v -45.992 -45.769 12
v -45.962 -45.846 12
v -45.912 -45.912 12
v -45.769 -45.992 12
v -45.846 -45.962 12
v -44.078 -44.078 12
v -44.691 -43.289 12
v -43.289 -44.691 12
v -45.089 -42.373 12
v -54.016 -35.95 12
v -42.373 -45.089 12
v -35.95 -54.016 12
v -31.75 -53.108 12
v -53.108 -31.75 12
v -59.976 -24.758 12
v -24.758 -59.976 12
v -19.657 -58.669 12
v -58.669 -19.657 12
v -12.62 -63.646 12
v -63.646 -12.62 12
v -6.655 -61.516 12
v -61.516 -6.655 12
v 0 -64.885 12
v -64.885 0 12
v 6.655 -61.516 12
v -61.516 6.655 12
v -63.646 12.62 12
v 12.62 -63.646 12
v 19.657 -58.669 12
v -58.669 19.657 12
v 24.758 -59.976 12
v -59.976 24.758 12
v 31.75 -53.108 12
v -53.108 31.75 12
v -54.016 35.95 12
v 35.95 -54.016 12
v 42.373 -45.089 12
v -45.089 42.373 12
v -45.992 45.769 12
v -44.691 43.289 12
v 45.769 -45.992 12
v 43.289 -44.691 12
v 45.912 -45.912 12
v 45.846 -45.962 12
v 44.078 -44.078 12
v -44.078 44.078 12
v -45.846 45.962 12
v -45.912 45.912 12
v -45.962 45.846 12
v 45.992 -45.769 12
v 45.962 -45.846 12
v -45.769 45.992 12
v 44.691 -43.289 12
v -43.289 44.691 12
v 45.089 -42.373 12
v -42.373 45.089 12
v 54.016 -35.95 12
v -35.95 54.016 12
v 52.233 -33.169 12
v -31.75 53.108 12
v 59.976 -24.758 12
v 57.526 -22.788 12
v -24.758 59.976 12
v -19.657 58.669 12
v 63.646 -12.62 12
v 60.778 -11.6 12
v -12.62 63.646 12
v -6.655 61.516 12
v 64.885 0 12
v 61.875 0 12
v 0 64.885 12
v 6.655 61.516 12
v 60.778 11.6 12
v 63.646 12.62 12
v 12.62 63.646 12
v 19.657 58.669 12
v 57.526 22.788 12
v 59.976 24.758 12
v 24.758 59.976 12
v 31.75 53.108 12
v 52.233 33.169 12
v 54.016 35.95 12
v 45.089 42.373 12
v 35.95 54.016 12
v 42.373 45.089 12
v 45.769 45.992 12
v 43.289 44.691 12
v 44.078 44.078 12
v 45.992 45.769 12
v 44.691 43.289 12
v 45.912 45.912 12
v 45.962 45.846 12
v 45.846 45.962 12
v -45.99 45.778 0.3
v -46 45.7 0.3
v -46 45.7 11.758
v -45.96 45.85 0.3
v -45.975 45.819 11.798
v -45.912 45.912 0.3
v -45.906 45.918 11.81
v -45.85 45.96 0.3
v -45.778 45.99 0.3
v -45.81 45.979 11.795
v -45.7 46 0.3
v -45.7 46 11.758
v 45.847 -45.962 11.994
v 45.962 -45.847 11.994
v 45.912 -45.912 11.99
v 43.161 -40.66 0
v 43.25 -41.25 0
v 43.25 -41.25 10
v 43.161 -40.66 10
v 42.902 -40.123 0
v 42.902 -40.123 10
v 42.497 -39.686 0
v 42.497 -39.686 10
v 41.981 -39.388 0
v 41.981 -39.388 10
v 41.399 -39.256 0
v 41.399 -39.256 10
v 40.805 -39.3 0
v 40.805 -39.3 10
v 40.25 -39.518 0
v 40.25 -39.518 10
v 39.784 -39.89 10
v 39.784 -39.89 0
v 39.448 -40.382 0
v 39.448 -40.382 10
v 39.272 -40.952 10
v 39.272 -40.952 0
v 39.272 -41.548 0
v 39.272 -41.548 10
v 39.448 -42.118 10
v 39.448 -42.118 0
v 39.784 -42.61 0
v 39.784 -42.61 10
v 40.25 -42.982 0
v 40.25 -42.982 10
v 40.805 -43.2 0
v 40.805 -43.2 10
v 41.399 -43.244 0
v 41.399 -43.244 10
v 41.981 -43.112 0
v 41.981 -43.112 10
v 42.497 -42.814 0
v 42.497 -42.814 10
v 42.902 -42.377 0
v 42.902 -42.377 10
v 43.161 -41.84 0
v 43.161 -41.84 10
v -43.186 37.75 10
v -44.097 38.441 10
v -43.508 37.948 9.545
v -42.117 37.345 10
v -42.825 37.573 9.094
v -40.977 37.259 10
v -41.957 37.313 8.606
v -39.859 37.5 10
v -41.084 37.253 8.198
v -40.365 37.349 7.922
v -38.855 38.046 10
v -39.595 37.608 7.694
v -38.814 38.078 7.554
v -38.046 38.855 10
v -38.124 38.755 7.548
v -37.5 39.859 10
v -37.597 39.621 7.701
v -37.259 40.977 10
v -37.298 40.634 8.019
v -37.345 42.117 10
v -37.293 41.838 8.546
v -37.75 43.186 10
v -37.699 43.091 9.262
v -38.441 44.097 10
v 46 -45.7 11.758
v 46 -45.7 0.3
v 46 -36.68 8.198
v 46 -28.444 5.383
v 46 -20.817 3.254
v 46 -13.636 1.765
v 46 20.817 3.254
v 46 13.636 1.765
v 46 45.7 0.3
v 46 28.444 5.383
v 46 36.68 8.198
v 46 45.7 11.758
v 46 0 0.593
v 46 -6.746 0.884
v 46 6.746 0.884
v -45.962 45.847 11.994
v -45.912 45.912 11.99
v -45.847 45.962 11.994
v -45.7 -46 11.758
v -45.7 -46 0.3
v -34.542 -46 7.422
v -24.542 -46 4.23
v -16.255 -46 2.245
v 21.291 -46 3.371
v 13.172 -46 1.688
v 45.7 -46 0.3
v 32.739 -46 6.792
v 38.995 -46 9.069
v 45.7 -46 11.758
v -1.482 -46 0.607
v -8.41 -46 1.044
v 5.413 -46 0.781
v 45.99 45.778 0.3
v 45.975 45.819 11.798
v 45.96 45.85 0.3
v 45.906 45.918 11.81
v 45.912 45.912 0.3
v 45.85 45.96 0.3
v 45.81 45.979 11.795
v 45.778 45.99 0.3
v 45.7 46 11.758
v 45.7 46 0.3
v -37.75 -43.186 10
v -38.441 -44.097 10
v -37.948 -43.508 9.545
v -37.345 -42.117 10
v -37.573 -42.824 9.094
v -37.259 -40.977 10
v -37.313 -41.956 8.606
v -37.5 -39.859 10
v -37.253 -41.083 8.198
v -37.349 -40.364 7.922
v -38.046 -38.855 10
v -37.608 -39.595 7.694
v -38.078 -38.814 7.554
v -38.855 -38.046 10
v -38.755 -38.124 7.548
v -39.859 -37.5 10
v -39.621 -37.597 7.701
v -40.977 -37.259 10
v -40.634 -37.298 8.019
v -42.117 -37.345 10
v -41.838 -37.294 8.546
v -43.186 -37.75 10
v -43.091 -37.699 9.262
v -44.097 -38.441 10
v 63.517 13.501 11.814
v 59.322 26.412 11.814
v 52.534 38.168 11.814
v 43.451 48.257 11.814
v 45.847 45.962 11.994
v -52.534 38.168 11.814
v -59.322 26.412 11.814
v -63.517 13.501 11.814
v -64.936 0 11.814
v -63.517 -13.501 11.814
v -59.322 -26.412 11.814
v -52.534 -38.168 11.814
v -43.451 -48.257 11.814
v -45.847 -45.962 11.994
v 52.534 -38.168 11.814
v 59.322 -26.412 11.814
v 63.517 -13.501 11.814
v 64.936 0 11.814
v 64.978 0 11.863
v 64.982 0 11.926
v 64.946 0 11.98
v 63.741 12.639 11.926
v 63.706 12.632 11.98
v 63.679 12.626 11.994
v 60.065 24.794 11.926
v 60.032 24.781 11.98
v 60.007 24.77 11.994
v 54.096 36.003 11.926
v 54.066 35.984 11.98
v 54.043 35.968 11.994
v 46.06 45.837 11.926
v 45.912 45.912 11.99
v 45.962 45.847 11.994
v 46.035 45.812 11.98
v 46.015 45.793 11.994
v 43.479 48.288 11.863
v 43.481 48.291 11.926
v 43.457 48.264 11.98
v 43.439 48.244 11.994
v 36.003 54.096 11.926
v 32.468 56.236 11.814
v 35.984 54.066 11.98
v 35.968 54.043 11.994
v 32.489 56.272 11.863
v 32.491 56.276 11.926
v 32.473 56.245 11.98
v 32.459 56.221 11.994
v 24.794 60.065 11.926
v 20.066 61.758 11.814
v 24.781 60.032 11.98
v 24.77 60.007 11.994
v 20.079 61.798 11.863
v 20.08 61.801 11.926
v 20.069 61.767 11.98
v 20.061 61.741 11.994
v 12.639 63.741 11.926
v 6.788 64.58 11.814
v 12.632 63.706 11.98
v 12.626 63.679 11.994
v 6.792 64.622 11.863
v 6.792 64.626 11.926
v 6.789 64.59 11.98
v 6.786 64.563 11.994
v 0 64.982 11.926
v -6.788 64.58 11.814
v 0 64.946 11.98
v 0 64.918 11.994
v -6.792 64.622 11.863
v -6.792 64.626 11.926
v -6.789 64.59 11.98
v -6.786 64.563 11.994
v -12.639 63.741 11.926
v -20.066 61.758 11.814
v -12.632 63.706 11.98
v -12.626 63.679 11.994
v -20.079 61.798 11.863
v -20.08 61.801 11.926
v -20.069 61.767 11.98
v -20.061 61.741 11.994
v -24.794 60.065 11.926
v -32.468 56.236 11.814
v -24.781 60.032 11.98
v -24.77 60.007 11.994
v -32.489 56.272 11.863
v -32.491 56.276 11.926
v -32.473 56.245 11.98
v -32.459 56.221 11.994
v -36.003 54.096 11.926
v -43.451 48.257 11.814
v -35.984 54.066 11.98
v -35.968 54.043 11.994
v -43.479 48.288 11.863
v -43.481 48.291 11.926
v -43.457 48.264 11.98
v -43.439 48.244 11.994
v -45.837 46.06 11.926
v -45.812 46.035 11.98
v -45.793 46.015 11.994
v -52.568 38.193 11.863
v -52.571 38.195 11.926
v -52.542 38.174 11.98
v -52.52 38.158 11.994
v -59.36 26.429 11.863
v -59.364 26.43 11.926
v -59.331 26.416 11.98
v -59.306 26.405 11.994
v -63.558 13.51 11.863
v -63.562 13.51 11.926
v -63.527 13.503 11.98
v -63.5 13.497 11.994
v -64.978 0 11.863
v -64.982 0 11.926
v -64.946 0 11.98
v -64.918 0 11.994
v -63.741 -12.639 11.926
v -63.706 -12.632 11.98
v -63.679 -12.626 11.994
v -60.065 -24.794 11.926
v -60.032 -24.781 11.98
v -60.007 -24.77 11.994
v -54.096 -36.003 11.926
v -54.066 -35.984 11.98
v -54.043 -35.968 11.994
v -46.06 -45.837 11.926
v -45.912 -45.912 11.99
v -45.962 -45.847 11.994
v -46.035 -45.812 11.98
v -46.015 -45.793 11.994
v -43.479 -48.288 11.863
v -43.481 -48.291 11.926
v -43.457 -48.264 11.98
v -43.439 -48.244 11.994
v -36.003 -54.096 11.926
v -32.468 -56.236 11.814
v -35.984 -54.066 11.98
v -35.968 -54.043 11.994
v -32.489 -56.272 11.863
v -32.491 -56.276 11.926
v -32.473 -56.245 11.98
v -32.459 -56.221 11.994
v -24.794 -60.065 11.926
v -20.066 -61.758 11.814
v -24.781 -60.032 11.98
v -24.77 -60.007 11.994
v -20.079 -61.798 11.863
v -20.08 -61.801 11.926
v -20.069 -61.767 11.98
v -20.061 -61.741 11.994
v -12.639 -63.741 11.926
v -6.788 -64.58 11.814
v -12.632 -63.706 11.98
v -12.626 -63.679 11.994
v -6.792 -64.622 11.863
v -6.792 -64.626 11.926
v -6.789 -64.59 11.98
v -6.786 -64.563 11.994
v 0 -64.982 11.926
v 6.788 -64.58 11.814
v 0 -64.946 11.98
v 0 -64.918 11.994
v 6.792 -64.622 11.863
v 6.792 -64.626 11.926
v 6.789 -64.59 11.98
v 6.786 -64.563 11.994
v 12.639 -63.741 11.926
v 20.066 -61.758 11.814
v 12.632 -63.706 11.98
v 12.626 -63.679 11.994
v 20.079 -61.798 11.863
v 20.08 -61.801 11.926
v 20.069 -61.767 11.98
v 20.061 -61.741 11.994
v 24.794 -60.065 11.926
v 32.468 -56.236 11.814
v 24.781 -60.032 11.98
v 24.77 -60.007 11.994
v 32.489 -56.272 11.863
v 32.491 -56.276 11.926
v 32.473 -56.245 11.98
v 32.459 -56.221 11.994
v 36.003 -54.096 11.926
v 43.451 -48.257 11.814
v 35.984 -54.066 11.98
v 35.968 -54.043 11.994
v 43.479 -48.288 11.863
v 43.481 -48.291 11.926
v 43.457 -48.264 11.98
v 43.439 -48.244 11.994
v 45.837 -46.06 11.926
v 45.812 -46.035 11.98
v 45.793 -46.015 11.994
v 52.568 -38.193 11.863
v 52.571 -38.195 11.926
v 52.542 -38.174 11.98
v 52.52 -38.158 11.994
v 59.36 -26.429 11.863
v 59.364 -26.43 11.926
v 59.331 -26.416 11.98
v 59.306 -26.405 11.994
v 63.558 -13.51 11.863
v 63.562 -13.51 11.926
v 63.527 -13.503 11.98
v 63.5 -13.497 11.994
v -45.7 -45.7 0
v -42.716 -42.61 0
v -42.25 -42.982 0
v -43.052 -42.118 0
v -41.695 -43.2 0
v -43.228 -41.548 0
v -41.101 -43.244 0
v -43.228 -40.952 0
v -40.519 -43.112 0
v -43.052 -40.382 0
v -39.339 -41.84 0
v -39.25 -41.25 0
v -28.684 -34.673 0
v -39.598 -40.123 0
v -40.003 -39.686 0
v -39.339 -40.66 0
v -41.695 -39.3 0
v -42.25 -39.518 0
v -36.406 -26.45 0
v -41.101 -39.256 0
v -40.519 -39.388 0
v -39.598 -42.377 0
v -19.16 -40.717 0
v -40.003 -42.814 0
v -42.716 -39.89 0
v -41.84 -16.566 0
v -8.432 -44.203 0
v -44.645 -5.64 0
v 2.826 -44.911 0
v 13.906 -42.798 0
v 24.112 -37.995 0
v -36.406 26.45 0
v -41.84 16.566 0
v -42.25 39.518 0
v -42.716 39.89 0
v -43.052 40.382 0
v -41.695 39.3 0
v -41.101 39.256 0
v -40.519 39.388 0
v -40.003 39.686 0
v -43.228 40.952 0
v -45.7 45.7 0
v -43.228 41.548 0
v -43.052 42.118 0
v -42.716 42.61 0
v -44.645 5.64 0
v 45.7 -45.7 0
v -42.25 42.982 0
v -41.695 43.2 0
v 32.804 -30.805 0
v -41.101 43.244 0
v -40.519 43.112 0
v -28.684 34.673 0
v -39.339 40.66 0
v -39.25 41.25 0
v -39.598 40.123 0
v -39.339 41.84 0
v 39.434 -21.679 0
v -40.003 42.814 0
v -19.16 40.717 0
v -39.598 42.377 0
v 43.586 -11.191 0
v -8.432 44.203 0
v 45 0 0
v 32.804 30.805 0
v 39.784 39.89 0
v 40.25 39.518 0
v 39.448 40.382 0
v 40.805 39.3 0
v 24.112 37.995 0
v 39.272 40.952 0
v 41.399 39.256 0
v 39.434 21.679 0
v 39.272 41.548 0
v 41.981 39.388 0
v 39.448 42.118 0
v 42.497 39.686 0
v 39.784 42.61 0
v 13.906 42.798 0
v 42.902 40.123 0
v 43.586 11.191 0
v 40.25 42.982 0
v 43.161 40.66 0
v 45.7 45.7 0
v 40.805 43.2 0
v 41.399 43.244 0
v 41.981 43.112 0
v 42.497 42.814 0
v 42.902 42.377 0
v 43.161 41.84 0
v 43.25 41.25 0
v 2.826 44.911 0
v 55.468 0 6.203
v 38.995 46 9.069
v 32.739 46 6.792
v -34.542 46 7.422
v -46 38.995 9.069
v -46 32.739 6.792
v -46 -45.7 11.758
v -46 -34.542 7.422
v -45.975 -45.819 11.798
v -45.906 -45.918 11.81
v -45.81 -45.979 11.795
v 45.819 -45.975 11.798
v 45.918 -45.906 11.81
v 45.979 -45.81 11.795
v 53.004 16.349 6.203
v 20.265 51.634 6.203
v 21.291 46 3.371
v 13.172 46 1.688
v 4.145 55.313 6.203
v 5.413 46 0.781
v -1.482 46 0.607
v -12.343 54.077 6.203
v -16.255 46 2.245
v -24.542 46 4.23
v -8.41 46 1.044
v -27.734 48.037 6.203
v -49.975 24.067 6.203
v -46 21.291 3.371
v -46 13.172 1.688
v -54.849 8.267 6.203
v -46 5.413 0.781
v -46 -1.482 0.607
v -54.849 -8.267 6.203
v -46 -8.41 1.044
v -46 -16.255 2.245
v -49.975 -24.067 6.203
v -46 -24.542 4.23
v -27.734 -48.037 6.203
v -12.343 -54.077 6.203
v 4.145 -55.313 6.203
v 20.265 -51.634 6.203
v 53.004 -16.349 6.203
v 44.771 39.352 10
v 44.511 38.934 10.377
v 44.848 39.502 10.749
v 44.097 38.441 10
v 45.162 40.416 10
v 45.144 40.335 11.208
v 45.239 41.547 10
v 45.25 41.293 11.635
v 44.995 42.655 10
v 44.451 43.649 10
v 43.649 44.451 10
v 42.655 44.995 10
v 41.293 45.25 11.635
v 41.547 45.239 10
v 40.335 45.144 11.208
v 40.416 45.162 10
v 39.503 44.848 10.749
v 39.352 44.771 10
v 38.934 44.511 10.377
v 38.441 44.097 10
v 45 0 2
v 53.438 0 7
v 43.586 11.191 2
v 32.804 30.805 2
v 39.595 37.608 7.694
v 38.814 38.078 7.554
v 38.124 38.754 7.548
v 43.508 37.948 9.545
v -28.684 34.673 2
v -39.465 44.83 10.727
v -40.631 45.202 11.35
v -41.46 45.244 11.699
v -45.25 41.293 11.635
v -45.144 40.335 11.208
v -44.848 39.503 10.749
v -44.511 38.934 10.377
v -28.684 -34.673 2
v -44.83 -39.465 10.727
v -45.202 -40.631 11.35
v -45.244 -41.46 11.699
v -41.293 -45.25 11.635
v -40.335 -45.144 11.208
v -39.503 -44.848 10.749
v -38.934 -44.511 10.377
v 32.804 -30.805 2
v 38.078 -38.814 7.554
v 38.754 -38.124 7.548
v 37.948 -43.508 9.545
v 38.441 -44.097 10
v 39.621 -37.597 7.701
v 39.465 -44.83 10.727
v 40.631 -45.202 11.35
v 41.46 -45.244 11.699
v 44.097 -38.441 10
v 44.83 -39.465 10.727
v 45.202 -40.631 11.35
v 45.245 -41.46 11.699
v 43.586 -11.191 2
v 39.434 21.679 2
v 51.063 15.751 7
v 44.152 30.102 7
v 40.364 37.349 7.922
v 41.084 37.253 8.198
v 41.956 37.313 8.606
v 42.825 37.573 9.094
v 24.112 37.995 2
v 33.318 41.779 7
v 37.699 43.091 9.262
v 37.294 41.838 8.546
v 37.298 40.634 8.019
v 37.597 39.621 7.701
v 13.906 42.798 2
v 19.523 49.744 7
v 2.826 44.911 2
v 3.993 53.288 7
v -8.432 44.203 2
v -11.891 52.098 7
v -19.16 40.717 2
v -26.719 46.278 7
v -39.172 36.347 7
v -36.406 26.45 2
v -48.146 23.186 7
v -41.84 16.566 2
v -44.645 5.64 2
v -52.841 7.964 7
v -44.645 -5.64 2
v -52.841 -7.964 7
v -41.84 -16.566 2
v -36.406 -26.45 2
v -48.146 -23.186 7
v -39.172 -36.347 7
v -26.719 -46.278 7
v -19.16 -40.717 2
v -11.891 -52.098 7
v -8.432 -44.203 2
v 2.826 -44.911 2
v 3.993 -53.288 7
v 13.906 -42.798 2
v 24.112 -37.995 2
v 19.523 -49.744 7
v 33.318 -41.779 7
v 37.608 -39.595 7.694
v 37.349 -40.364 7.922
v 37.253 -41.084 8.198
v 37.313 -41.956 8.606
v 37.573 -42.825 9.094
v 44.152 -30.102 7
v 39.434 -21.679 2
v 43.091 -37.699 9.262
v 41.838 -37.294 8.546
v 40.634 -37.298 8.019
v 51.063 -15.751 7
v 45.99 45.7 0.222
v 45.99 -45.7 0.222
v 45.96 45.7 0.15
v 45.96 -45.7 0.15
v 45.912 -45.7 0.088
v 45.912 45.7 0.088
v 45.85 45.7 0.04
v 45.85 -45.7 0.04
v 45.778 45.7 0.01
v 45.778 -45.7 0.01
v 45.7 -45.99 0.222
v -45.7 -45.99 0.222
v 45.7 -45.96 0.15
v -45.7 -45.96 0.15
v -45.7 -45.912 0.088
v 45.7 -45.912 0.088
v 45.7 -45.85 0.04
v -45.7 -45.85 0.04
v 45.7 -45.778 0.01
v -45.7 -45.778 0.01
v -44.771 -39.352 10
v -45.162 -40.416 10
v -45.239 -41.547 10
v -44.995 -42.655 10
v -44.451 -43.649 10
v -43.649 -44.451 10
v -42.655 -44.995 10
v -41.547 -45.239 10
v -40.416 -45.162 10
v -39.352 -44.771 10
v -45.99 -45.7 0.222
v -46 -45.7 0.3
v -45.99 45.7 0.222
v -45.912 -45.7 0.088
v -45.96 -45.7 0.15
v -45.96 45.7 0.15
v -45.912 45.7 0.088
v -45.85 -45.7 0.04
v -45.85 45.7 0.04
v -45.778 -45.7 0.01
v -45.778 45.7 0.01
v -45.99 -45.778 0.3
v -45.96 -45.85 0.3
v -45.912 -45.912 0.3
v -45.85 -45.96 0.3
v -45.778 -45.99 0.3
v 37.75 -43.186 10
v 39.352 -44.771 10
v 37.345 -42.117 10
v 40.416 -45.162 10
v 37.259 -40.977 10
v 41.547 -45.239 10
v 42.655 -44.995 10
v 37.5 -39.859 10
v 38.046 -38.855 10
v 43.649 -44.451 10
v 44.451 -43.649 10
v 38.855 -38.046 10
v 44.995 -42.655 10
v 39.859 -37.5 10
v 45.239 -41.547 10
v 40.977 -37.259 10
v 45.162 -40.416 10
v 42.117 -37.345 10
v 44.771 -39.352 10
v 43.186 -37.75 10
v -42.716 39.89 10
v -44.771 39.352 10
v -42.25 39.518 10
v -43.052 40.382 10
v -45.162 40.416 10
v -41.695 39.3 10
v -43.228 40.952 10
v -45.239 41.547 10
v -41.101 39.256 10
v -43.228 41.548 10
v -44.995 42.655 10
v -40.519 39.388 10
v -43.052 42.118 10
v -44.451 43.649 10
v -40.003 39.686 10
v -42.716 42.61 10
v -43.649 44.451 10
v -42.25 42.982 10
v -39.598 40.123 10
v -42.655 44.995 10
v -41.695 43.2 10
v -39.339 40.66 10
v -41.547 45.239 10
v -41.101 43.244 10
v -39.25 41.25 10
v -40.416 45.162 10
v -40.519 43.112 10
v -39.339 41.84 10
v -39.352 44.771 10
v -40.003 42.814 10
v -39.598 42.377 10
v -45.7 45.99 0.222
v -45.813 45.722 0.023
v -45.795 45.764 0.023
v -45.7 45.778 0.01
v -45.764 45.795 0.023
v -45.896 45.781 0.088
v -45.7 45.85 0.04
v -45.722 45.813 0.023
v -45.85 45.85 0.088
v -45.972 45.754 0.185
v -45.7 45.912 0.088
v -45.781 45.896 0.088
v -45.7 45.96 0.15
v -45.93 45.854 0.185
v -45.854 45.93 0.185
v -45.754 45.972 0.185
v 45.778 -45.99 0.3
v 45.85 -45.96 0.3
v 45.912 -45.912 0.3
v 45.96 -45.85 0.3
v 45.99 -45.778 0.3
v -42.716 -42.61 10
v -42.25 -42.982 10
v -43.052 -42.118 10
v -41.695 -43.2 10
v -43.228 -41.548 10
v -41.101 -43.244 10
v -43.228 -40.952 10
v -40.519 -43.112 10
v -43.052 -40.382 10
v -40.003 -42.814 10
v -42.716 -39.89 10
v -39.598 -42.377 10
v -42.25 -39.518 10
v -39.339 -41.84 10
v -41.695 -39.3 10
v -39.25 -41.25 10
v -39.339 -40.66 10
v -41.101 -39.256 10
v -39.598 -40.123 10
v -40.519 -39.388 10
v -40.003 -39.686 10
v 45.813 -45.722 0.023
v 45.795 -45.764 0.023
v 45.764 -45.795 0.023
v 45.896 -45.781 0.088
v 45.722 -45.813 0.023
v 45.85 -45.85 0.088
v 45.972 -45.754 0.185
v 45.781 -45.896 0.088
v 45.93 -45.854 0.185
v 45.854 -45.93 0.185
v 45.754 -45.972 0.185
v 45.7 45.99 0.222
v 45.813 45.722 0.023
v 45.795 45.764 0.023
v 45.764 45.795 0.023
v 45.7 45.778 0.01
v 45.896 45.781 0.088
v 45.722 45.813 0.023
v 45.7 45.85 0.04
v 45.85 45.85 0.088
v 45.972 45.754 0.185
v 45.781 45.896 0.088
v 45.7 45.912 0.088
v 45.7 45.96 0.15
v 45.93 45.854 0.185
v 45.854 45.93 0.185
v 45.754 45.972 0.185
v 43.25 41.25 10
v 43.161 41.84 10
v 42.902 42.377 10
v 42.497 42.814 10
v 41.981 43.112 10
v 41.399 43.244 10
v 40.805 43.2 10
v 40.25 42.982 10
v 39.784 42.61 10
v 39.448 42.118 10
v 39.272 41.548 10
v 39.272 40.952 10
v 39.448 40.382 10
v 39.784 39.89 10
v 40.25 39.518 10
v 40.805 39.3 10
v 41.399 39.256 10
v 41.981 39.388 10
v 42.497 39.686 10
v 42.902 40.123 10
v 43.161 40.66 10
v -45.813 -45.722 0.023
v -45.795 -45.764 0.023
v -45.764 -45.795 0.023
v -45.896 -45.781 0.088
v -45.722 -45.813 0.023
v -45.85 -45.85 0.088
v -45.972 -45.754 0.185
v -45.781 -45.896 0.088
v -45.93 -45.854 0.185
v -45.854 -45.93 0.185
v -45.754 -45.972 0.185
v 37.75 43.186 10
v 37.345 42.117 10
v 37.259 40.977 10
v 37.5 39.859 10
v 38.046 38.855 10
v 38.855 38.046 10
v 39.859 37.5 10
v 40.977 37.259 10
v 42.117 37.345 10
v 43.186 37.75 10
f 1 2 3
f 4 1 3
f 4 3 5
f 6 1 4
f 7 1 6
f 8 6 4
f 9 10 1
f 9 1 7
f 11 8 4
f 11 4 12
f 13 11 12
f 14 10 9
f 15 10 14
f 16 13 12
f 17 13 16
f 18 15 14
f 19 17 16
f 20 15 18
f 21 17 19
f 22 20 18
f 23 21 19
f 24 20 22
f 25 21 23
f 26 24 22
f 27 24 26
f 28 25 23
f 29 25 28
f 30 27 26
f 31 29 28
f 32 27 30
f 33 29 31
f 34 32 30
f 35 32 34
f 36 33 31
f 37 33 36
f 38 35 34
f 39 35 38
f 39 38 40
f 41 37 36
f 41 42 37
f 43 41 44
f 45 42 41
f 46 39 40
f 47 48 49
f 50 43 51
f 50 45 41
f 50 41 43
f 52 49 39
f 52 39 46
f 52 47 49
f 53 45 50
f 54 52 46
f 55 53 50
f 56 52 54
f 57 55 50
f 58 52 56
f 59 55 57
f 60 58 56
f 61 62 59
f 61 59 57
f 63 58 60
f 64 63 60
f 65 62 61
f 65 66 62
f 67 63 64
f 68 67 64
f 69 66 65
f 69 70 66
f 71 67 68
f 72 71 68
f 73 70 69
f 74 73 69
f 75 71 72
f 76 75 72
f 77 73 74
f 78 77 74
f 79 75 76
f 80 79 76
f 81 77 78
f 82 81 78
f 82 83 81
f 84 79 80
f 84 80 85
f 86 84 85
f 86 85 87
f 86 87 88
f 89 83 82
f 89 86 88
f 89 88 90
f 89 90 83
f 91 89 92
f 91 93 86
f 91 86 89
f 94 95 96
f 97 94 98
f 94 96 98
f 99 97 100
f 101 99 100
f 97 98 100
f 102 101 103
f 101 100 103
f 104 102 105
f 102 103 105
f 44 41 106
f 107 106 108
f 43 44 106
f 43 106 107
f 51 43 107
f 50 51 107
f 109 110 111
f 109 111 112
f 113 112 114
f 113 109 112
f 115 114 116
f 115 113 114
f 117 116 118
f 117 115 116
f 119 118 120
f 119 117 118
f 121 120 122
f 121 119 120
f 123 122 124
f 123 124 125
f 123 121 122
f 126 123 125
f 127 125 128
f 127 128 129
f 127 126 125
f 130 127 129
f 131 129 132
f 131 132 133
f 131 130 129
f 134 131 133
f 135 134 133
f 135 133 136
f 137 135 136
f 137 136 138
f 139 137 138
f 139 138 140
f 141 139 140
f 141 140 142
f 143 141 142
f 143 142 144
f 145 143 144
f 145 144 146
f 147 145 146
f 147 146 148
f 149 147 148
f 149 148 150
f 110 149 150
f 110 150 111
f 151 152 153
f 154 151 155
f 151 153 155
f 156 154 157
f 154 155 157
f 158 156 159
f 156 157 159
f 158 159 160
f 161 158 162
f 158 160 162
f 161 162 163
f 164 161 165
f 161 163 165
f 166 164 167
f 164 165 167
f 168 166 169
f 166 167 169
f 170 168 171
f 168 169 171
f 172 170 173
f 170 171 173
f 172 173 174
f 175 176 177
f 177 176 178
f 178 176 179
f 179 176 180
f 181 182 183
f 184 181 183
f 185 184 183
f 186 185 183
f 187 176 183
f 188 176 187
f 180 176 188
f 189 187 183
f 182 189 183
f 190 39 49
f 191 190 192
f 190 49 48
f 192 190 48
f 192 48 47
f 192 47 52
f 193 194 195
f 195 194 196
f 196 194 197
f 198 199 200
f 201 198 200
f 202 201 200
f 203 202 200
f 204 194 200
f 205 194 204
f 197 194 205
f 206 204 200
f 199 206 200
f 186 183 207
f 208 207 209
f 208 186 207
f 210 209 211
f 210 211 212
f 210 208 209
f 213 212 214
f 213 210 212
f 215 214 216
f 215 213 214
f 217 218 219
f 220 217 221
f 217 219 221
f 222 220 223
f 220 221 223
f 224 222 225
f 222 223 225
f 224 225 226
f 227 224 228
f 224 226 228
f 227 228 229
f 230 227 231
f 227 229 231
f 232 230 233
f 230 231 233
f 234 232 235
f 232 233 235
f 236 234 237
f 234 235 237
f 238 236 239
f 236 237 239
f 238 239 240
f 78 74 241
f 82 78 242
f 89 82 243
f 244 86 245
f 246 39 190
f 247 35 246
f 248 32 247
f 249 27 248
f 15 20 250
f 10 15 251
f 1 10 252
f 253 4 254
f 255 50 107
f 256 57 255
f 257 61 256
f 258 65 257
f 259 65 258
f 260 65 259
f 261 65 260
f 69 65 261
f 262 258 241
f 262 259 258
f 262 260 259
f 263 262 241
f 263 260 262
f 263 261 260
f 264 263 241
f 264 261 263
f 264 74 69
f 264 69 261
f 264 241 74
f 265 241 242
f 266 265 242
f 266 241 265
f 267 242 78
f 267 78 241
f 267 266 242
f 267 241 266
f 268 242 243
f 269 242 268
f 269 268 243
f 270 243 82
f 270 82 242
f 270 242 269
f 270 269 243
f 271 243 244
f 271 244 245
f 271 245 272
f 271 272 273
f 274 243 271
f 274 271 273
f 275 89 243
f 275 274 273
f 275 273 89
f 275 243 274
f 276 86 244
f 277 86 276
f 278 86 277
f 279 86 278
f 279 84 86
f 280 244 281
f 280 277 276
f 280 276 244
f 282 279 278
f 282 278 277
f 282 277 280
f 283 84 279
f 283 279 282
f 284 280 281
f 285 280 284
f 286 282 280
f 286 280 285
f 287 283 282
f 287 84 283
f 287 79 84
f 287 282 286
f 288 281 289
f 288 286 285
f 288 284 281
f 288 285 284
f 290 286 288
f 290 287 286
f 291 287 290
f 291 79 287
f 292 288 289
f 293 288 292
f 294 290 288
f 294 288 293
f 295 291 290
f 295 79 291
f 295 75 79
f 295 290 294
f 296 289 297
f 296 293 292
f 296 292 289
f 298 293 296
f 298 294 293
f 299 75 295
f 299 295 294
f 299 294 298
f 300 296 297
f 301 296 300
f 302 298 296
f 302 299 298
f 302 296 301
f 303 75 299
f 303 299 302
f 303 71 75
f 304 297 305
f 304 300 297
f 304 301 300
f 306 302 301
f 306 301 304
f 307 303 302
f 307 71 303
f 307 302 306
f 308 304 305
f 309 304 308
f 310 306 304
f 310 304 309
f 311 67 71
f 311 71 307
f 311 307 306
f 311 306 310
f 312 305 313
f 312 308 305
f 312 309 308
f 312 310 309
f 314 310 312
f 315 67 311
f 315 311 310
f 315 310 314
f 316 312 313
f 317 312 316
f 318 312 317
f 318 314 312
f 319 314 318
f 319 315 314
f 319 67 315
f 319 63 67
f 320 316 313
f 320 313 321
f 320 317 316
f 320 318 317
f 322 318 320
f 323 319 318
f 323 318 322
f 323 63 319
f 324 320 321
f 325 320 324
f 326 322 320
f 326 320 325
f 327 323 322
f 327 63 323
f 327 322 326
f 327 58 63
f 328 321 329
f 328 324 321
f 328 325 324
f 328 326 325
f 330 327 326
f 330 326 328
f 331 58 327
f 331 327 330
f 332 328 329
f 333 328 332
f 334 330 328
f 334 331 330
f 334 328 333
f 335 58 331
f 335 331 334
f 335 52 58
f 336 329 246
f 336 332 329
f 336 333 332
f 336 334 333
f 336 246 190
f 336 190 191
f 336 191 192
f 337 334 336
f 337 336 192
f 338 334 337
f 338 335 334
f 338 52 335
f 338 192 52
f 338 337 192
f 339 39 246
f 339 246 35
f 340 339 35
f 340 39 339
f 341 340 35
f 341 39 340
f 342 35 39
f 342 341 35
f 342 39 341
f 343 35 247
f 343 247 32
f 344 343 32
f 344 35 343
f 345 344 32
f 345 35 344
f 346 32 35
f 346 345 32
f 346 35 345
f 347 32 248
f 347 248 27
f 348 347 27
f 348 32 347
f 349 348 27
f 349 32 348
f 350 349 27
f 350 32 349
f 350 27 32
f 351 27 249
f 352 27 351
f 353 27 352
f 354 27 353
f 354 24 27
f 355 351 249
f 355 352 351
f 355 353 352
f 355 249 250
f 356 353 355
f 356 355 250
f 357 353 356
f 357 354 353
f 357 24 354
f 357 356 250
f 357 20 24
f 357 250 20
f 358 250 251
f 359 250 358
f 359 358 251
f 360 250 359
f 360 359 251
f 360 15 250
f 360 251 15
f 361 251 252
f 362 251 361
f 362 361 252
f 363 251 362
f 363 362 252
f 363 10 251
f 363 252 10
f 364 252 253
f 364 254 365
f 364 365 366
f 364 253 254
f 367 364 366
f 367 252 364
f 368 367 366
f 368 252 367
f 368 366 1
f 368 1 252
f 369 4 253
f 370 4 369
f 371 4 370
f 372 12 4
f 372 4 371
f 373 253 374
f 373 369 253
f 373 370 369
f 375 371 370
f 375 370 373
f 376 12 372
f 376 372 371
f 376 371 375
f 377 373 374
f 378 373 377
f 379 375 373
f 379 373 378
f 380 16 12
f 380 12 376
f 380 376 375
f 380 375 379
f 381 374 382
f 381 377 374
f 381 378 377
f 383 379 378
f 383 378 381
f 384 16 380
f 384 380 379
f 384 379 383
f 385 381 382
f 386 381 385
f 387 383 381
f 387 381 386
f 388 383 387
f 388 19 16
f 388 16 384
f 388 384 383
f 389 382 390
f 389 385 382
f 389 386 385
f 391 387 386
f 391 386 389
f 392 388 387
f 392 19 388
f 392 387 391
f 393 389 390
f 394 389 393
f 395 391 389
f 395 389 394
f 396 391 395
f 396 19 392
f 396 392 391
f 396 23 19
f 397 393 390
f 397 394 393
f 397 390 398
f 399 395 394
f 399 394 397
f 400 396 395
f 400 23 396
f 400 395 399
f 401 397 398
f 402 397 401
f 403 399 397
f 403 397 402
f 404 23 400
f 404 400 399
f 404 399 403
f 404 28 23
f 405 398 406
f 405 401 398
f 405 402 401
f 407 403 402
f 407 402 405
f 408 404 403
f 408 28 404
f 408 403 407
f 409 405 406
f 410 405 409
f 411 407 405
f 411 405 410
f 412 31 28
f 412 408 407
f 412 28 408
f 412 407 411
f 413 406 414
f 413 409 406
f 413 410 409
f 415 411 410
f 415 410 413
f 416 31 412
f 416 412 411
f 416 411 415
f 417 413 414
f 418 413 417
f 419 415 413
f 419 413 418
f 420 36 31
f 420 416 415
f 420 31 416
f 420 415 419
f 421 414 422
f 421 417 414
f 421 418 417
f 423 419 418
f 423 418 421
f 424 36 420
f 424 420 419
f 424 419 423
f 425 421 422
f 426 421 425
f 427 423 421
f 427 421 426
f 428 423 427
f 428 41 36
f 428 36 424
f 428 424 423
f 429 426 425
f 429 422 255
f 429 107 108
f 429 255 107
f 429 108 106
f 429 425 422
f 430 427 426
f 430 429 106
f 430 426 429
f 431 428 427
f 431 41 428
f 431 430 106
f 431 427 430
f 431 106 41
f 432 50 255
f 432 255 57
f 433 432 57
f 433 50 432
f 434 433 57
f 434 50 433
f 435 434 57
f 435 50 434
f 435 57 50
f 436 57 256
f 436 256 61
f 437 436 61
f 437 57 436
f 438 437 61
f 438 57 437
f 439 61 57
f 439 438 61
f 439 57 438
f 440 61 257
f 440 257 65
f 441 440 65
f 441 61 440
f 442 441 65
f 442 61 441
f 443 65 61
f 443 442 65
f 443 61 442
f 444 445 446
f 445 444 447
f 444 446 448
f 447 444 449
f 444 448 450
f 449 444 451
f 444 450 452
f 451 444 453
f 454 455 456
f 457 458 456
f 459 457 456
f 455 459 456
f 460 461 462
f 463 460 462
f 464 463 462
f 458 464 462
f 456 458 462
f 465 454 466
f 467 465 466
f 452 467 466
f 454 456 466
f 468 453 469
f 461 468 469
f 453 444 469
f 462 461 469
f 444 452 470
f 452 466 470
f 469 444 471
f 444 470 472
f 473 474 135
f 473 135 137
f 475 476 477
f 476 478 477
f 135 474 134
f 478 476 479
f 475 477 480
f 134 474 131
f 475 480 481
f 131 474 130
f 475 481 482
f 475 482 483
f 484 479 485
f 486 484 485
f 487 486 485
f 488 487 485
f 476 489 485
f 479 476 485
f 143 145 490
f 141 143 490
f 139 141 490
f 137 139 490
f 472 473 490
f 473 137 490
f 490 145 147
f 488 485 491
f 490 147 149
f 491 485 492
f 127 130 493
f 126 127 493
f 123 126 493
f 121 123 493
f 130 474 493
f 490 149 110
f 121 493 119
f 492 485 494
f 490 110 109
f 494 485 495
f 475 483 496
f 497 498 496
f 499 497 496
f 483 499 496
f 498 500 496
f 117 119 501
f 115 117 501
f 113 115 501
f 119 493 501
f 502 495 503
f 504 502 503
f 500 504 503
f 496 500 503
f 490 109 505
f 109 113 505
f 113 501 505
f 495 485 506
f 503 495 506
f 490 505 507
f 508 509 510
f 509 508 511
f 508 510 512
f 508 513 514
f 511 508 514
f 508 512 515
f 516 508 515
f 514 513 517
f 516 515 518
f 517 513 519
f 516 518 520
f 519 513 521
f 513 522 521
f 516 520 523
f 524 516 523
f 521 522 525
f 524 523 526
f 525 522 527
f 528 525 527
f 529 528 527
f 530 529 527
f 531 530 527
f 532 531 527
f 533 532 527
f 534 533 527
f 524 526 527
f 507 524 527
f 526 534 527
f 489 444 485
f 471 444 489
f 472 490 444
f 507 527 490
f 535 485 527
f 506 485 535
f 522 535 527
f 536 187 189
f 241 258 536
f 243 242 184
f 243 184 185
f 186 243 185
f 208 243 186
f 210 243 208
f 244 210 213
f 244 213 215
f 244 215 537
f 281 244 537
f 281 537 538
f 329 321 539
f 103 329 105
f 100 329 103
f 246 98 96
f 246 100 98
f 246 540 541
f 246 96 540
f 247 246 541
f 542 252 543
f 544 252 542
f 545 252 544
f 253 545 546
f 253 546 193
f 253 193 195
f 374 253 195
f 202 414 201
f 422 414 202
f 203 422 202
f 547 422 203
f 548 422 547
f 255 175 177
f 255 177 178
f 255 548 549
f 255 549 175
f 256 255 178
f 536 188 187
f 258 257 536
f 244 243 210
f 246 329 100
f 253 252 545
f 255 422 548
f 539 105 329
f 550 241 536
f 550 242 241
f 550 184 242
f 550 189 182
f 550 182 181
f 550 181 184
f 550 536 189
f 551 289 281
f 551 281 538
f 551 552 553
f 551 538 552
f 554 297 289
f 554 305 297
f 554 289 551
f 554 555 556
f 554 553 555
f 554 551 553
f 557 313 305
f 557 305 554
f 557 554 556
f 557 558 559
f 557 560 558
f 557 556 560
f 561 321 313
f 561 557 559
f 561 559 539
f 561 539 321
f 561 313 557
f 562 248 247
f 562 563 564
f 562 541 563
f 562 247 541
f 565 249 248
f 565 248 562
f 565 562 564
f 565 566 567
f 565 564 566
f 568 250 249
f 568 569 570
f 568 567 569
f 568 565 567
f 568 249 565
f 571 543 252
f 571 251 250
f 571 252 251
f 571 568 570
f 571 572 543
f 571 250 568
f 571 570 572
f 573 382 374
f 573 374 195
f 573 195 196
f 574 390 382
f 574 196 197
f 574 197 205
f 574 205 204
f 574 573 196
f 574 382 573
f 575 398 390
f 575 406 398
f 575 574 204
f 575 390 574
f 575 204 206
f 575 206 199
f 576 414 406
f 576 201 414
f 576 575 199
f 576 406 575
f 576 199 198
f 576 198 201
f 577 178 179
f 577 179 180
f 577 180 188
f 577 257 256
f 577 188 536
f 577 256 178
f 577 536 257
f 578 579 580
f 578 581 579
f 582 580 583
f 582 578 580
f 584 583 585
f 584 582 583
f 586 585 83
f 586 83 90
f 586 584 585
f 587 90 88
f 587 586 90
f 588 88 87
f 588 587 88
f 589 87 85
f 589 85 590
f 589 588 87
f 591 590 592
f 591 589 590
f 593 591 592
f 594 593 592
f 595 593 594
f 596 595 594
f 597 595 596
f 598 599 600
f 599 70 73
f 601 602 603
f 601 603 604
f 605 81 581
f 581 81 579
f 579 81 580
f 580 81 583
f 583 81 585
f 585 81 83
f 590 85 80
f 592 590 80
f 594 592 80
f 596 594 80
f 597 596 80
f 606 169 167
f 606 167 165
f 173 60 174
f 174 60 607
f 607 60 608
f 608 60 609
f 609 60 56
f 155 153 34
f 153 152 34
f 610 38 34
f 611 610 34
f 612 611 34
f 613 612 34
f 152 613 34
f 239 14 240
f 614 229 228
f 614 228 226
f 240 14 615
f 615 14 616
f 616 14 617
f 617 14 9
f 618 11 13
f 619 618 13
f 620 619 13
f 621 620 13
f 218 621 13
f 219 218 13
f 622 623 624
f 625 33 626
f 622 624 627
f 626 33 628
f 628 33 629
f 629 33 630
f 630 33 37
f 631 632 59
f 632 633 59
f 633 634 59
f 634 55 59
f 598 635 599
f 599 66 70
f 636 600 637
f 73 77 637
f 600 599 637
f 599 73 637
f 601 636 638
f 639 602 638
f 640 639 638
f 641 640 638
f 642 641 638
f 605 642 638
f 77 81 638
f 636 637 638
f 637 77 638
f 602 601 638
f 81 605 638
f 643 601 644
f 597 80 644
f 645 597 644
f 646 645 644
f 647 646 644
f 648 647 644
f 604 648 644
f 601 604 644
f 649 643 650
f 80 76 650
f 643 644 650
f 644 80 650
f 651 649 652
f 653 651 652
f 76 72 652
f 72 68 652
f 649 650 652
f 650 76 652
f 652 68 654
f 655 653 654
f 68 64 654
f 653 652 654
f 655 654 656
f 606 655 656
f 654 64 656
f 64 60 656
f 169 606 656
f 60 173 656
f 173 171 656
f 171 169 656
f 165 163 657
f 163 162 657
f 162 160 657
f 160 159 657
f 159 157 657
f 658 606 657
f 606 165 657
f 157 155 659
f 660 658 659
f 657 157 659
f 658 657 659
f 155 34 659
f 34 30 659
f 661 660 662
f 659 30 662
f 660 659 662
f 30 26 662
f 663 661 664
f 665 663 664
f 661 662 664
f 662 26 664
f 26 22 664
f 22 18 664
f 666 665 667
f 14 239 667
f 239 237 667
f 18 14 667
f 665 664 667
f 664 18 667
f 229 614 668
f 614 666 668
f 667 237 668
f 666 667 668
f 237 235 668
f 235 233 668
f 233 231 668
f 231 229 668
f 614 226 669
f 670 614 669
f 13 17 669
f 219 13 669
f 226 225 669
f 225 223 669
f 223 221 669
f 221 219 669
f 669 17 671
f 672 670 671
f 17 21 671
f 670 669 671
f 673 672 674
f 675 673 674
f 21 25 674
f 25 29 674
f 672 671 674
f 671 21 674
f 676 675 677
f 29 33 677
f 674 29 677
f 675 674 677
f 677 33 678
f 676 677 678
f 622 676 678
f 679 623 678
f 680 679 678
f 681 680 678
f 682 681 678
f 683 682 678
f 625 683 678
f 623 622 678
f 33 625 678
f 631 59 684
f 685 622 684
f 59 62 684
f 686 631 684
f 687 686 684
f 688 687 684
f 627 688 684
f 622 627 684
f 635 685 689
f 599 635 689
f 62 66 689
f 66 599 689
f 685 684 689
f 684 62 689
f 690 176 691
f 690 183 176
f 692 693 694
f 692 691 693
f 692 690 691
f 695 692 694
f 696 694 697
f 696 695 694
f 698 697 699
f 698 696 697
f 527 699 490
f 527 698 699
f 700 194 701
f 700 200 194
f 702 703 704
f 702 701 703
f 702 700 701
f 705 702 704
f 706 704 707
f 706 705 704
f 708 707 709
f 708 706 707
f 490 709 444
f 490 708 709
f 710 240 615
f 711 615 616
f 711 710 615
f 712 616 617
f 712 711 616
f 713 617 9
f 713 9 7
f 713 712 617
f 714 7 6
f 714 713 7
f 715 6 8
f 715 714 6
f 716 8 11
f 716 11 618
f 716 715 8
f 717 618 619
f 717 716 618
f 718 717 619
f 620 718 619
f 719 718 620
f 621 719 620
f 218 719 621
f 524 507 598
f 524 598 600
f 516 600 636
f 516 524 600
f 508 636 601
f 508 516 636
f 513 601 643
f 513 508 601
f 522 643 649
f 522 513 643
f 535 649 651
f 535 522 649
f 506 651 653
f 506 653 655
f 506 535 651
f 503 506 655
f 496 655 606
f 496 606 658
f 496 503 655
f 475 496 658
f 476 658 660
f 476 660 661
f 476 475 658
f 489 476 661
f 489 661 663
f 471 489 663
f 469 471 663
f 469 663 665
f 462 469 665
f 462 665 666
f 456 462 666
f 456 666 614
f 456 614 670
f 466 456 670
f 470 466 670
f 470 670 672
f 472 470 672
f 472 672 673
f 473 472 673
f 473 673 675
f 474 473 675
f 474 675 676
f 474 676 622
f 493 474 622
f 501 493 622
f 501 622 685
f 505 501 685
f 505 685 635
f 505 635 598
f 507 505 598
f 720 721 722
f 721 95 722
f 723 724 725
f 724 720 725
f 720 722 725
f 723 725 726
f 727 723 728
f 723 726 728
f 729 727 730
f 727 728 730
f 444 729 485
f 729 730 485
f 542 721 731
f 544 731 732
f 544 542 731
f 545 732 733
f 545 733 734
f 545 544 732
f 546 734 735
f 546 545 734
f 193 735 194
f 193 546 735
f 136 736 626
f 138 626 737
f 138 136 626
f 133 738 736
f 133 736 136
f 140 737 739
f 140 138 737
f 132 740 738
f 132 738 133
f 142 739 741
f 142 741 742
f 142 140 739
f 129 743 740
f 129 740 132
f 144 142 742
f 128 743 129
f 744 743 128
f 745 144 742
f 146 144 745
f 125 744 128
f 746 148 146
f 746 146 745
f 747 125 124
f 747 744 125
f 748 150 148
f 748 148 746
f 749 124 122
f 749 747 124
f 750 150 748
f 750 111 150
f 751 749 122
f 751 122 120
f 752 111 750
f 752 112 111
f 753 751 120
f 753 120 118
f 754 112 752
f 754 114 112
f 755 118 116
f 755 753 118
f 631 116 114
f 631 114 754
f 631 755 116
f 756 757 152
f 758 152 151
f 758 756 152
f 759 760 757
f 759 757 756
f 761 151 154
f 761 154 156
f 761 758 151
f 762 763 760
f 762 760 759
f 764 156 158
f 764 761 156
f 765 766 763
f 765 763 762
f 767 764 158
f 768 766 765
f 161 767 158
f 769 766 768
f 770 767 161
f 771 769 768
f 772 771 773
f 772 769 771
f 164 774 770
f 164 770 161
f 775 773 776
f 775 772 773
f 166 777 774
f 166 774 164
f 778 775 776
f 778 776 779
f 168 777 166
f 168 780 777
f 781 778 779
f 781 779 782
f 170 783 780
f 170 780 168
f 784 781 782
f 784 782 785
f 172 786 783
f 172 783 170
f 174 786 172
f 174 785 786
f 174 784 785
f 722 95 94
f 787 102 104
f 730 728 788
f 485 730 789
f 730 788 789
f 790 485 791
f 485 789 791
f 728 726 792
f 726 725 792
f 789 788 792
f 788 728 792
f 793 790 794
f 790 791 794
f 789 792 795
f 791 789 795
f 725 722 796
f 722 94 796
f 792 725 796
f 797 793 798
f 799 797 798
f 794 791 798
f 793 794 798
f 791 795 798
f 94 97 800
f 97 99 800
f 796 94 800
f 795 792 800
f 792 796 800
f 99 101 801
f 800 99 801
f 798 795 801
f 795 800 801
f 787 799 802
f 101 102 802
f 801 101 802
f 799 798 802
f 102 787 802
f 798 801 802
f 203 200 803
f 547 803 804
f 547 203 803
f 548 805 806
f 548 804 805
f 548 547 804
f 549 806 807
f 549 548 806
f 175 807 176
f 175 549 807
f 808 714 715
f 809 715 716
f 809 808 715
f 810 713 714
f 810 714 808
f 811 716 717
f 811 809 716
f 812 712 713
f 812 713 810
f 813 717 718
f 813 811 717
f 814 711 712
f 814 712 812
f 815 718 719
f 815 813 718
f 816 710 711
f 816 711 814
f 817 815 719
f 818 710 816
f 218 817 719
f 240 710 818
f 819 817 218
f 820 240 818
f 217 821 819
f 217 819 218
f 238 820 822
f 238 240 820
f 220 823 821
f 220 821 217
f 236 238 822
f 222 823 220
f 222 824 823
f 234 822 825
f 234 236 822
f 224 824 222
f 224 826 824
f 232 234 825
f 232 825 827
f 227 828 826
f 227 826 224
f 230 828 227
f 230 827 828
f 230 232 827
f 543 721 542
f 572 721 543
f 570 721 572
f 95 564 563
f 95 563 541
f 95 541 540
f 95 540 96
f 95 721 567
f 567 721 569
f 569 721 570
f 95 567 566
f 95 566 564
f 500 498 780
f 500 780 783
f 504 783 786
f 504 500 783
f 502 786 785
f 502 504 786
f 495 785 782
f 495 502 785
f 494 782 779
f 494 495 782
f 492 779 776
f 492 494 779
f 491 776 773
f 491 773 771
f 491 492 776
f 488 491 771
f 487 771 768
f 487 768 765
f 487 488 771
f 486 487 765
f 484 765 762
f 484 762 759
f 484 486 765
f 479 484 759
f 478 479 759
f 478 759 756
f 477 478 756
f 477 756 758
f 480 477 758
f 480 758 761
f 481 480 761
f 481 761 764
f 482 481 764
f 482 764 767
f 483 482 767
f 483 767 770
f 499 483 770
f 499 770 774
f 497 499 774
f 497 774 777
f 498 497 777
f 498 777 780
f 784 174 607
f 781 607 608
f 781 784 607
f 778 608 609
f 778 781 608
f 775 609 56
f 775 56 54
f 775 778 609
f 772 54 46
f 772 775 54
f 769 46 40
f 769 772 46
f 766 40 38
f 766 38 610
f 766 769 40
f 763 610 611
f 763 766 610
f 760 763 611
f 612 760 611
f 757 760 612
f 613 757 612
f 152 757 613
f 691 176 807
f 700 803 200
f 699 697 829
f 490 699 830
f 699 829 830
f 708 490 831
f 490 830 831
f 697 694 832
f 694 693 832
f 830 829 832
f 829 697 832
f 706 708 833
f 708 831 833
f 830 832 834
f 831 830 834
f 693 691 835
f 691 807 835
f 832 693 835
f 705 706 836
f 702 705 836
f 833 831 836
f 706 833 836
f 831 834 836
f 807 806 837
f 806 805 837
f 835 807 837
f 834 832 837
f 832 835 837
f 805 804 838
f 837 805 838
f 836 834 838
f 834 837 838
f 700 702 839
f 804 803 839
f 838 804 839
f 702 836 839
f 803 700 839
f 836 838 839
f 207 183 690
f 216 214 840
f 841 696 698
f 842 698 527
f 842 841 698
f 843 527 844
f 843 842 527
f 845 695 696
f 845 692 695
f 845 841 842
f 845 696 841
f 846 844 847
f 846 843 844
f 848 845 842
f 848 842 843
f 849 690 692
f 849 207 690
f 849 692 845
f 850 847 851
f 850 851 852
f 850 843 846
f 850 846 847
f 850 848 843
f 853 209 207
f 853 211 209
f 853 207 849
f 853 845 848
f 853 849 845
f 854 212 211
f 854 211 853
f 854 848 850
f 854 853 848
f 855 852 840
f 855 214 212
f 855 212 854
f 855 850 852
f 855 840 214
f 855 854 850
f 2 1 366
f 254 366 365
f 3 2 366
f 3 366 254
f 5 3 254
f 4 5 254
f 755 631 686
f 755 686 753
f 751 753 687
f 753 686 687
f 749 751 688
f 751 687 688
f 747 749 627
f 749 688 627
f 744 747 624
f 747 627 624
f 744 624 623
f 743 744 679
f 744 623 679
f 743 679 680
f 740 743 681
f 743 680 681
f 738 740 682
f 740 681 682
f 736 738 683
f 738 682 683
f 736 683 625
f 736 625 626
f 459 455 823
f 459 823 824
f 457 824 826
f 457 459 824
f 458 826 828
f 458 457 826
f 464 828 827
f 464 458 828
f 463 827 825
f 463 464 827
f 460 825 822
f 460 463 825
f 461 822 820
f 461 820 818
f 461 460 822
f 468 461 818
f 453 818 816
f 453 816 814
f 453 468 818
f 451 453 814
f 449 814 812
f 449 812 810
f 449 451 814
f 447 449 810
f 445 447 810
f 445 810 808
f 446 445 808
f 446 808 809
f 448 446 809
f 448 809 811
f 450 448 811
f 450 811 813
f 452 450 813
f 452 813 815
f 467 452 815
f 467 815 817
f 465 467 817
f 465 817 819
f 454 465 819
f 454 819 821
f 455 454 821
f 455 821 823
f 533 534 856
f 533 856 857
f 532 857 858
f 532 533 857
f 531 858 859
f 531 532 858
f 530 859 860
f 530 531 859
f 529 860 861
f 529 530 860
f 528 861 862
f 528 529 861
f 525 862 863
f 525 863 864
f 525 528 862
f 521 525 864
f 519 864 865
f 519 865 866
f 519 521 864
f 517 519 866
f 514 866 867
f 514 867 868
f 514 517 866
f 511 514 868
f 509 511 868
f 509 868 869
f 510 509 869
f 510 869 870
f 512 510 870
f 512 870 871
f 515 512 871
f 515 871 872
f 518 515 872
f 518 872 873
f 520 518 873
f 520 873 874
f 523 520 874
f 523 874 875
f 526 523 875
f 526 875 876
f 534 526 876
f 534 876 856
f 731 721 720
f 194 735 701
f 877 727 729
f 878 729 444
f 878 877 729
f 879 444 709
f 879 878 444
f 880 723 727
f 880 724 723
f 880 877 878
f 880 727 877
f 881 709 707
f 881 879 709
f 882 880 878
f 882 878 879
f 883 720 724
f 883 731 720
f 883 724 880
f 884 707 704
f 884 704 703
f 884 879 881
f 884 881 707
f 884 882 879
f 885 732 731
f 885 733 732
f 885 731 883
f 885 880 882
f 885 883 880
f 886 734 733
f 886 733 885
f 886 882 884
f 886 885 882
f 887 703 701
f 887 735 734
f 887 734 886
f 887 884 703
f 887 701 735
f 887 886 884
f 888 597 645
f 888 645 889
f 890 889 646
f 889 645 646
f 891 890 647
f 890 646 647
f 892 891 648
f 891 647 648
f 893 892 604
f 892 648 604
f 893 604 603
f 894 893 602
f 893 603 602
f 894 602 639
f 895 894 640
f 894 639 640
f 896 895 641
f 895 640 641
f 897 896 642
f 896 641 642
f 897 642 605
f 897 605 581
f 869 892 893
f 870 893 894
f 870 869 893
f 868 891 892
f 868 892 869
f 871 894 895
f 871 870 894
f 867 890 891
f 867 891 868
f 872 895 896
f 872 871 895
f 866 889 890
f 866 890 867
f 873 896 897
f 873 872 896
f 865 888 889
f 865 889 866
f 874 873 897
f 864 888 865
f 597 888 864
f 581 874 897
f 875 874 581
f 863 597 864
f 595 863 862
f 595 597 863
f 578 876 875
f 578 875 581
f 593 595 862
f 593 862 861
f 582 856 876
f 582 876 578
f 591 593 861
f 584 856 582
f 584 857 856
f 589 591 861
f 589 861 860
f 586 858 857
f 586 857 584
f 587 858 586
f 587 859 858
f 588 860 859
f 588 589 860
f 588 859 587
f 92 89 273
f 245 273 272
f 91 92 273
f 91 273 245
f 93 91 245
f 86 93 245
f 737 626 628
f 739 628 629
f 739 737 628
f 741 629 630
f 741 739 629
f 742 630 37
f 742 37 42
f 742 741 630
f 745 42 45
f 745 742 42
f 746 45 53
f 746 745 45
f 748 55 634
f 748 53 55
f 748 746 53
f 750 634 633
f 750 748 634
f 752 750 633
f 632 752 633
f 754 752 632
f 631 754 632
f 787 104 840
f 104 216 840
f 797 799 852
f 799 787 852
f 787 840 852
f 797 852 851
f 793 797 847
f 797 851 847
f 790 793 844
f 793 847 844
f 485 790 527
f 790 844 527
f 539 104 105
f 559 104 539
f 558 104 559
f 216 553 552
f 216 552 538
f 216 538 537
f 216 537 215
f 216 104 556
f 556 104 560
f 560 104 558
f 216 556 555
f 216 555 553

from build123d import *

# Parameters (mm, degrees)
CYLINDER009_R     = 4
CYLINDER009_DEPTH = 4
CYLINDER011_R     = 4
CYLINDER011_DEPTH = 4
CYLINDER010_R     = 4
CYLINDER010_DEPTH = 4
CYLINDER012_R     = 4
CYLINDER012_DEPTH = 4
CYLINDER007_R     = 2
CYLINDER007_DEPTH = 17
CYLINDER005_R     = 2
CYLINDER005_DEPTH = 17
CYLINDER006_R     = 2
CYLINDER006_DEPTH = 17
CYLINDER008_R     = 2
CYLINDER008_DEPTH = 17
CYLINDER004_R     = 4
CYLINDER004_DEPTH = 10
CYLINDER003_R     = 4
CYLINDER003_DEPTH = 10
CYLINDER002_R     = 4
CYLINDER002_DEPTH = 10
CYLINDER001_R     = 4
CYLINDER001_DEPTH = 10
CYLINDER_R        = 45
CYLINDER_DEPTH    = 15
FILLET001_R       = 0.1
BOX_W             = 92
BOX_H             = 92
BOX_DEPTH         = 12
FILLET_R          = 0.3


with BuildPart() as cylinder009:
    # Cylinder009 → Cylinder009 (new body)
    with BuildSketch(Plane(origin=(41.25, 41.25, 10), x_dir=(1, 0, 0), z_dir=(0, 0, 1))):
        Circle(CYLINDER009_R)
    extrude(amount=CYLINDER009_DEPTH)


with BuildPart() as cylinder011:
    # Cylinder011 → Cylinder011 (new body)
    with BuildSketch(Plane(origin=(-41.25, -41.25, 10), x_dir=(1, 0, 0), z_dir=(0, 0, 1))):
        Circle(CYLINDER011_R)
    extrude(amount=CYLINDER011_DEPTH)


with BuildPart() as cylinder010:
    # Cylinder010 → Cylinder010 (new body)
    with BuildSketch(Plane(origin=(-41.25, 41.25, 10), x_dir=(1, 0, 0), z_dir=(0, 0, 1))):
        Circle(CYLINDER010_R)
    extrude(amount=CYLINDER010_DEPTH)


with BuildPart() as fusion004:
    # Cylinder012 → Cylinder012 (new body)
    with BuildSketch(Plane(origin=(41.25, -41.25, 10), x_dir=(1, 0, 0), z_dir=(0, 0, 1))):
        Circle(CYLINDER012_R)
    extrude(amount=CYLINDER012_DEPTH)

    # Fusion004: union Cylinder009, Cylinder011, Cylinder010
    add(cylinder009.part)
    add(cylinder011.part)
    add(cylinder010.part)


with BuildPart() as cylinder007:
    # Cylinder007 → Cylinder007 (new body)
    with BuildSketch(Plane(origin=(41.25, -41.25, -3), x_dir=(1, 0, 0), z_dir=(0, 0, 1))):
        Circle(CYLINDER007_R)
    extrude(amount=CYLINDER007_DEPTH)


with BuildPart() as cylinder005:
    # Cylinder005 → Cylinder005 (new body)
    with BuildSketch(Plane(origin=(41.25, 41.25, -3), x_dir=(1, 0, 0), z_dir=(0, 0, 1))):
        Circle(CYLINDER005_R)
    extrude(amount=CYLINDER005_DEPTH)


with BuildPart() as cylinder006:
    # Cylinder006 → Cylinder006 (new body)
    with BuildSketch(Plane(origin=(-41.25, 41.25, -3), x_dir=(1, 0, 0), z_dir=(0, 0, 1))):
        Circle(CYLINDER006_R)
    extrude(amount=CYLINDER006_DEPTH)


with BuildPart() as fusion003:
    # Cylinder008 → Cylinder008 (new body)
    with BuildSketch(Plane(origin=(-41.25, -41.25, -3), x_dir=(1, 0, 0), z_dir=(0, 0, 1))):
        Circle(CYLINDER008_R)
    extrude(amount=CYLINDER008_DEPTH)

    # Fusion003: union Cylinder007, Cylinder005, Cylinder006
    add(cylinder007.part)
    add(cylinder005.part)
    add(cylinder006.part)


with BuildPart() as cylinder004:
    # Cylinder004 → Cylinder004 (new body)
    with BuildSketch(Plane(origin=(-41.25, -41.25, 0), x_dir=(1, 0, 0), z_dir=(0, 0, 1))):
        Circle(CYLINDER004_R)
    extrude(amount=CYLINDER004_DEPTH)


with BuildPart() as cylinder003:
    # Cylinder003 → Cylinder003 (new body)
    with BuildSketch(Plane(origin=(41.25, -41.25, 0), x_dir=(1, 0, 0), z_dir=(0, 0, 1))):
        Circle(CYLINDER003_R)
    extrude(amount=CYLINDER003_DEPTH)


with BuildPart() as cylinder002:
    # Cylinder002 → Cylinder002 (new body)
    with BuildSketch(Plane(origin=(-41.25, 41.25, 0), x_dir=(1, 0, 0), z_dir=(0, 0, 1))):
        Circle(CYLINDER002_R)
    extrude(amount=CYLINDER002_DEPTH)


with BuildPart() as cylinder001:
    # Cylinder001 → Cylinder001 (new body)
    with BuildSketch(Plane(origin=(41.25, 41.25, 0), x_dir=(1, 0, 0), z_dir=(0, 0, 1))):
        Circle(CYLINDER001_R)
    extrude(amount=CYLINDER001_DEPTH)


with BuildPart() as cone001:
    # Cone001 → Cone001 (revolve)
    with BuildSketch(Plane(origin=(0, 0, 2), x_dir=(1, 0, 0), z_dir=(0, -1, 0))):
        Polygon((0, 0), (45, 0), (65.25, 12), (0, 12), align=None)
    revolve(axis=Axis((0, 0, 2), (0, 0, 1)))


with BuildPart() as void:
    # Cylinder → Cylinder (new body)
    with BuildSketch(Plane.XY.offset(-1)):
        Circle(CYLINDER_R)
    extrude(amount=CYLINDER_DEPTH)

    # Fusion001: union Cone001
    add(cone001.part)


with BuildPart() as fillet001:
    # Cone → Cone (revolve)
    with BuildSketch(Plane.XZ):
        Polygon((0, 0), (45, 0), (65.25, 12), (0, 12), align=None)
    revolve(axis=Axis((0, 0, 0), (0, 0, 1)))

    # Fillet001
    fillet001_edges = [fillet001.edges().sort_by_distance(p)[0] for p in [
        (-65.25, 0, 12),
    ]]
    fillet(fillet001_edges, radius=FILLET001_R)


with BuildPart() as cut002:
    # Box → Box (new body)
    with BuildSketch(Plane(origin=(-46, -46, 0), x_dir=(1, 0, 0), z_dir=(0, 0, 1))):
        with Locations((46, 46)):
            Rectangle(BOX_W, BOX_H)
    extrude(amount=BOX_DEPTH)

    # Fillet
    fillet_edges = [cut002.edges().sort_by_distance(p)[0] for p in [
        (-46, -46, 6),
        (-46, 46, 6),
        (-46, 0, 0),
        (46, -46, 6),
        (46, 46, 6),
        (46, 0, 0),
        (0, -46, 0),
        (0, 46, 0),
    ]]
    fillet(fillet_edges, radius=FILLET_R)

    # Fusion: union Fillet001
    add(fillet001.part)

    # Cut: cut void
    add(void.part, mode=Mode.SUBTRACT)

    # Fusion002: union Cylinder004, Cylinder003, Cylinder002, Cylinder001
    add(cylinder004.part)
    add(cylinder003.part)
    add(cylinder002.part)
    add(cylinder001.part)

    # Cut001: cut Fusion003
    add(fusion003.part, mode=Mode.SUBTRACT)

    # Cut002: cut Fusion004
    add(fusion004.part, mode=Mode.SUBTRACT)


solid = cut002.part
